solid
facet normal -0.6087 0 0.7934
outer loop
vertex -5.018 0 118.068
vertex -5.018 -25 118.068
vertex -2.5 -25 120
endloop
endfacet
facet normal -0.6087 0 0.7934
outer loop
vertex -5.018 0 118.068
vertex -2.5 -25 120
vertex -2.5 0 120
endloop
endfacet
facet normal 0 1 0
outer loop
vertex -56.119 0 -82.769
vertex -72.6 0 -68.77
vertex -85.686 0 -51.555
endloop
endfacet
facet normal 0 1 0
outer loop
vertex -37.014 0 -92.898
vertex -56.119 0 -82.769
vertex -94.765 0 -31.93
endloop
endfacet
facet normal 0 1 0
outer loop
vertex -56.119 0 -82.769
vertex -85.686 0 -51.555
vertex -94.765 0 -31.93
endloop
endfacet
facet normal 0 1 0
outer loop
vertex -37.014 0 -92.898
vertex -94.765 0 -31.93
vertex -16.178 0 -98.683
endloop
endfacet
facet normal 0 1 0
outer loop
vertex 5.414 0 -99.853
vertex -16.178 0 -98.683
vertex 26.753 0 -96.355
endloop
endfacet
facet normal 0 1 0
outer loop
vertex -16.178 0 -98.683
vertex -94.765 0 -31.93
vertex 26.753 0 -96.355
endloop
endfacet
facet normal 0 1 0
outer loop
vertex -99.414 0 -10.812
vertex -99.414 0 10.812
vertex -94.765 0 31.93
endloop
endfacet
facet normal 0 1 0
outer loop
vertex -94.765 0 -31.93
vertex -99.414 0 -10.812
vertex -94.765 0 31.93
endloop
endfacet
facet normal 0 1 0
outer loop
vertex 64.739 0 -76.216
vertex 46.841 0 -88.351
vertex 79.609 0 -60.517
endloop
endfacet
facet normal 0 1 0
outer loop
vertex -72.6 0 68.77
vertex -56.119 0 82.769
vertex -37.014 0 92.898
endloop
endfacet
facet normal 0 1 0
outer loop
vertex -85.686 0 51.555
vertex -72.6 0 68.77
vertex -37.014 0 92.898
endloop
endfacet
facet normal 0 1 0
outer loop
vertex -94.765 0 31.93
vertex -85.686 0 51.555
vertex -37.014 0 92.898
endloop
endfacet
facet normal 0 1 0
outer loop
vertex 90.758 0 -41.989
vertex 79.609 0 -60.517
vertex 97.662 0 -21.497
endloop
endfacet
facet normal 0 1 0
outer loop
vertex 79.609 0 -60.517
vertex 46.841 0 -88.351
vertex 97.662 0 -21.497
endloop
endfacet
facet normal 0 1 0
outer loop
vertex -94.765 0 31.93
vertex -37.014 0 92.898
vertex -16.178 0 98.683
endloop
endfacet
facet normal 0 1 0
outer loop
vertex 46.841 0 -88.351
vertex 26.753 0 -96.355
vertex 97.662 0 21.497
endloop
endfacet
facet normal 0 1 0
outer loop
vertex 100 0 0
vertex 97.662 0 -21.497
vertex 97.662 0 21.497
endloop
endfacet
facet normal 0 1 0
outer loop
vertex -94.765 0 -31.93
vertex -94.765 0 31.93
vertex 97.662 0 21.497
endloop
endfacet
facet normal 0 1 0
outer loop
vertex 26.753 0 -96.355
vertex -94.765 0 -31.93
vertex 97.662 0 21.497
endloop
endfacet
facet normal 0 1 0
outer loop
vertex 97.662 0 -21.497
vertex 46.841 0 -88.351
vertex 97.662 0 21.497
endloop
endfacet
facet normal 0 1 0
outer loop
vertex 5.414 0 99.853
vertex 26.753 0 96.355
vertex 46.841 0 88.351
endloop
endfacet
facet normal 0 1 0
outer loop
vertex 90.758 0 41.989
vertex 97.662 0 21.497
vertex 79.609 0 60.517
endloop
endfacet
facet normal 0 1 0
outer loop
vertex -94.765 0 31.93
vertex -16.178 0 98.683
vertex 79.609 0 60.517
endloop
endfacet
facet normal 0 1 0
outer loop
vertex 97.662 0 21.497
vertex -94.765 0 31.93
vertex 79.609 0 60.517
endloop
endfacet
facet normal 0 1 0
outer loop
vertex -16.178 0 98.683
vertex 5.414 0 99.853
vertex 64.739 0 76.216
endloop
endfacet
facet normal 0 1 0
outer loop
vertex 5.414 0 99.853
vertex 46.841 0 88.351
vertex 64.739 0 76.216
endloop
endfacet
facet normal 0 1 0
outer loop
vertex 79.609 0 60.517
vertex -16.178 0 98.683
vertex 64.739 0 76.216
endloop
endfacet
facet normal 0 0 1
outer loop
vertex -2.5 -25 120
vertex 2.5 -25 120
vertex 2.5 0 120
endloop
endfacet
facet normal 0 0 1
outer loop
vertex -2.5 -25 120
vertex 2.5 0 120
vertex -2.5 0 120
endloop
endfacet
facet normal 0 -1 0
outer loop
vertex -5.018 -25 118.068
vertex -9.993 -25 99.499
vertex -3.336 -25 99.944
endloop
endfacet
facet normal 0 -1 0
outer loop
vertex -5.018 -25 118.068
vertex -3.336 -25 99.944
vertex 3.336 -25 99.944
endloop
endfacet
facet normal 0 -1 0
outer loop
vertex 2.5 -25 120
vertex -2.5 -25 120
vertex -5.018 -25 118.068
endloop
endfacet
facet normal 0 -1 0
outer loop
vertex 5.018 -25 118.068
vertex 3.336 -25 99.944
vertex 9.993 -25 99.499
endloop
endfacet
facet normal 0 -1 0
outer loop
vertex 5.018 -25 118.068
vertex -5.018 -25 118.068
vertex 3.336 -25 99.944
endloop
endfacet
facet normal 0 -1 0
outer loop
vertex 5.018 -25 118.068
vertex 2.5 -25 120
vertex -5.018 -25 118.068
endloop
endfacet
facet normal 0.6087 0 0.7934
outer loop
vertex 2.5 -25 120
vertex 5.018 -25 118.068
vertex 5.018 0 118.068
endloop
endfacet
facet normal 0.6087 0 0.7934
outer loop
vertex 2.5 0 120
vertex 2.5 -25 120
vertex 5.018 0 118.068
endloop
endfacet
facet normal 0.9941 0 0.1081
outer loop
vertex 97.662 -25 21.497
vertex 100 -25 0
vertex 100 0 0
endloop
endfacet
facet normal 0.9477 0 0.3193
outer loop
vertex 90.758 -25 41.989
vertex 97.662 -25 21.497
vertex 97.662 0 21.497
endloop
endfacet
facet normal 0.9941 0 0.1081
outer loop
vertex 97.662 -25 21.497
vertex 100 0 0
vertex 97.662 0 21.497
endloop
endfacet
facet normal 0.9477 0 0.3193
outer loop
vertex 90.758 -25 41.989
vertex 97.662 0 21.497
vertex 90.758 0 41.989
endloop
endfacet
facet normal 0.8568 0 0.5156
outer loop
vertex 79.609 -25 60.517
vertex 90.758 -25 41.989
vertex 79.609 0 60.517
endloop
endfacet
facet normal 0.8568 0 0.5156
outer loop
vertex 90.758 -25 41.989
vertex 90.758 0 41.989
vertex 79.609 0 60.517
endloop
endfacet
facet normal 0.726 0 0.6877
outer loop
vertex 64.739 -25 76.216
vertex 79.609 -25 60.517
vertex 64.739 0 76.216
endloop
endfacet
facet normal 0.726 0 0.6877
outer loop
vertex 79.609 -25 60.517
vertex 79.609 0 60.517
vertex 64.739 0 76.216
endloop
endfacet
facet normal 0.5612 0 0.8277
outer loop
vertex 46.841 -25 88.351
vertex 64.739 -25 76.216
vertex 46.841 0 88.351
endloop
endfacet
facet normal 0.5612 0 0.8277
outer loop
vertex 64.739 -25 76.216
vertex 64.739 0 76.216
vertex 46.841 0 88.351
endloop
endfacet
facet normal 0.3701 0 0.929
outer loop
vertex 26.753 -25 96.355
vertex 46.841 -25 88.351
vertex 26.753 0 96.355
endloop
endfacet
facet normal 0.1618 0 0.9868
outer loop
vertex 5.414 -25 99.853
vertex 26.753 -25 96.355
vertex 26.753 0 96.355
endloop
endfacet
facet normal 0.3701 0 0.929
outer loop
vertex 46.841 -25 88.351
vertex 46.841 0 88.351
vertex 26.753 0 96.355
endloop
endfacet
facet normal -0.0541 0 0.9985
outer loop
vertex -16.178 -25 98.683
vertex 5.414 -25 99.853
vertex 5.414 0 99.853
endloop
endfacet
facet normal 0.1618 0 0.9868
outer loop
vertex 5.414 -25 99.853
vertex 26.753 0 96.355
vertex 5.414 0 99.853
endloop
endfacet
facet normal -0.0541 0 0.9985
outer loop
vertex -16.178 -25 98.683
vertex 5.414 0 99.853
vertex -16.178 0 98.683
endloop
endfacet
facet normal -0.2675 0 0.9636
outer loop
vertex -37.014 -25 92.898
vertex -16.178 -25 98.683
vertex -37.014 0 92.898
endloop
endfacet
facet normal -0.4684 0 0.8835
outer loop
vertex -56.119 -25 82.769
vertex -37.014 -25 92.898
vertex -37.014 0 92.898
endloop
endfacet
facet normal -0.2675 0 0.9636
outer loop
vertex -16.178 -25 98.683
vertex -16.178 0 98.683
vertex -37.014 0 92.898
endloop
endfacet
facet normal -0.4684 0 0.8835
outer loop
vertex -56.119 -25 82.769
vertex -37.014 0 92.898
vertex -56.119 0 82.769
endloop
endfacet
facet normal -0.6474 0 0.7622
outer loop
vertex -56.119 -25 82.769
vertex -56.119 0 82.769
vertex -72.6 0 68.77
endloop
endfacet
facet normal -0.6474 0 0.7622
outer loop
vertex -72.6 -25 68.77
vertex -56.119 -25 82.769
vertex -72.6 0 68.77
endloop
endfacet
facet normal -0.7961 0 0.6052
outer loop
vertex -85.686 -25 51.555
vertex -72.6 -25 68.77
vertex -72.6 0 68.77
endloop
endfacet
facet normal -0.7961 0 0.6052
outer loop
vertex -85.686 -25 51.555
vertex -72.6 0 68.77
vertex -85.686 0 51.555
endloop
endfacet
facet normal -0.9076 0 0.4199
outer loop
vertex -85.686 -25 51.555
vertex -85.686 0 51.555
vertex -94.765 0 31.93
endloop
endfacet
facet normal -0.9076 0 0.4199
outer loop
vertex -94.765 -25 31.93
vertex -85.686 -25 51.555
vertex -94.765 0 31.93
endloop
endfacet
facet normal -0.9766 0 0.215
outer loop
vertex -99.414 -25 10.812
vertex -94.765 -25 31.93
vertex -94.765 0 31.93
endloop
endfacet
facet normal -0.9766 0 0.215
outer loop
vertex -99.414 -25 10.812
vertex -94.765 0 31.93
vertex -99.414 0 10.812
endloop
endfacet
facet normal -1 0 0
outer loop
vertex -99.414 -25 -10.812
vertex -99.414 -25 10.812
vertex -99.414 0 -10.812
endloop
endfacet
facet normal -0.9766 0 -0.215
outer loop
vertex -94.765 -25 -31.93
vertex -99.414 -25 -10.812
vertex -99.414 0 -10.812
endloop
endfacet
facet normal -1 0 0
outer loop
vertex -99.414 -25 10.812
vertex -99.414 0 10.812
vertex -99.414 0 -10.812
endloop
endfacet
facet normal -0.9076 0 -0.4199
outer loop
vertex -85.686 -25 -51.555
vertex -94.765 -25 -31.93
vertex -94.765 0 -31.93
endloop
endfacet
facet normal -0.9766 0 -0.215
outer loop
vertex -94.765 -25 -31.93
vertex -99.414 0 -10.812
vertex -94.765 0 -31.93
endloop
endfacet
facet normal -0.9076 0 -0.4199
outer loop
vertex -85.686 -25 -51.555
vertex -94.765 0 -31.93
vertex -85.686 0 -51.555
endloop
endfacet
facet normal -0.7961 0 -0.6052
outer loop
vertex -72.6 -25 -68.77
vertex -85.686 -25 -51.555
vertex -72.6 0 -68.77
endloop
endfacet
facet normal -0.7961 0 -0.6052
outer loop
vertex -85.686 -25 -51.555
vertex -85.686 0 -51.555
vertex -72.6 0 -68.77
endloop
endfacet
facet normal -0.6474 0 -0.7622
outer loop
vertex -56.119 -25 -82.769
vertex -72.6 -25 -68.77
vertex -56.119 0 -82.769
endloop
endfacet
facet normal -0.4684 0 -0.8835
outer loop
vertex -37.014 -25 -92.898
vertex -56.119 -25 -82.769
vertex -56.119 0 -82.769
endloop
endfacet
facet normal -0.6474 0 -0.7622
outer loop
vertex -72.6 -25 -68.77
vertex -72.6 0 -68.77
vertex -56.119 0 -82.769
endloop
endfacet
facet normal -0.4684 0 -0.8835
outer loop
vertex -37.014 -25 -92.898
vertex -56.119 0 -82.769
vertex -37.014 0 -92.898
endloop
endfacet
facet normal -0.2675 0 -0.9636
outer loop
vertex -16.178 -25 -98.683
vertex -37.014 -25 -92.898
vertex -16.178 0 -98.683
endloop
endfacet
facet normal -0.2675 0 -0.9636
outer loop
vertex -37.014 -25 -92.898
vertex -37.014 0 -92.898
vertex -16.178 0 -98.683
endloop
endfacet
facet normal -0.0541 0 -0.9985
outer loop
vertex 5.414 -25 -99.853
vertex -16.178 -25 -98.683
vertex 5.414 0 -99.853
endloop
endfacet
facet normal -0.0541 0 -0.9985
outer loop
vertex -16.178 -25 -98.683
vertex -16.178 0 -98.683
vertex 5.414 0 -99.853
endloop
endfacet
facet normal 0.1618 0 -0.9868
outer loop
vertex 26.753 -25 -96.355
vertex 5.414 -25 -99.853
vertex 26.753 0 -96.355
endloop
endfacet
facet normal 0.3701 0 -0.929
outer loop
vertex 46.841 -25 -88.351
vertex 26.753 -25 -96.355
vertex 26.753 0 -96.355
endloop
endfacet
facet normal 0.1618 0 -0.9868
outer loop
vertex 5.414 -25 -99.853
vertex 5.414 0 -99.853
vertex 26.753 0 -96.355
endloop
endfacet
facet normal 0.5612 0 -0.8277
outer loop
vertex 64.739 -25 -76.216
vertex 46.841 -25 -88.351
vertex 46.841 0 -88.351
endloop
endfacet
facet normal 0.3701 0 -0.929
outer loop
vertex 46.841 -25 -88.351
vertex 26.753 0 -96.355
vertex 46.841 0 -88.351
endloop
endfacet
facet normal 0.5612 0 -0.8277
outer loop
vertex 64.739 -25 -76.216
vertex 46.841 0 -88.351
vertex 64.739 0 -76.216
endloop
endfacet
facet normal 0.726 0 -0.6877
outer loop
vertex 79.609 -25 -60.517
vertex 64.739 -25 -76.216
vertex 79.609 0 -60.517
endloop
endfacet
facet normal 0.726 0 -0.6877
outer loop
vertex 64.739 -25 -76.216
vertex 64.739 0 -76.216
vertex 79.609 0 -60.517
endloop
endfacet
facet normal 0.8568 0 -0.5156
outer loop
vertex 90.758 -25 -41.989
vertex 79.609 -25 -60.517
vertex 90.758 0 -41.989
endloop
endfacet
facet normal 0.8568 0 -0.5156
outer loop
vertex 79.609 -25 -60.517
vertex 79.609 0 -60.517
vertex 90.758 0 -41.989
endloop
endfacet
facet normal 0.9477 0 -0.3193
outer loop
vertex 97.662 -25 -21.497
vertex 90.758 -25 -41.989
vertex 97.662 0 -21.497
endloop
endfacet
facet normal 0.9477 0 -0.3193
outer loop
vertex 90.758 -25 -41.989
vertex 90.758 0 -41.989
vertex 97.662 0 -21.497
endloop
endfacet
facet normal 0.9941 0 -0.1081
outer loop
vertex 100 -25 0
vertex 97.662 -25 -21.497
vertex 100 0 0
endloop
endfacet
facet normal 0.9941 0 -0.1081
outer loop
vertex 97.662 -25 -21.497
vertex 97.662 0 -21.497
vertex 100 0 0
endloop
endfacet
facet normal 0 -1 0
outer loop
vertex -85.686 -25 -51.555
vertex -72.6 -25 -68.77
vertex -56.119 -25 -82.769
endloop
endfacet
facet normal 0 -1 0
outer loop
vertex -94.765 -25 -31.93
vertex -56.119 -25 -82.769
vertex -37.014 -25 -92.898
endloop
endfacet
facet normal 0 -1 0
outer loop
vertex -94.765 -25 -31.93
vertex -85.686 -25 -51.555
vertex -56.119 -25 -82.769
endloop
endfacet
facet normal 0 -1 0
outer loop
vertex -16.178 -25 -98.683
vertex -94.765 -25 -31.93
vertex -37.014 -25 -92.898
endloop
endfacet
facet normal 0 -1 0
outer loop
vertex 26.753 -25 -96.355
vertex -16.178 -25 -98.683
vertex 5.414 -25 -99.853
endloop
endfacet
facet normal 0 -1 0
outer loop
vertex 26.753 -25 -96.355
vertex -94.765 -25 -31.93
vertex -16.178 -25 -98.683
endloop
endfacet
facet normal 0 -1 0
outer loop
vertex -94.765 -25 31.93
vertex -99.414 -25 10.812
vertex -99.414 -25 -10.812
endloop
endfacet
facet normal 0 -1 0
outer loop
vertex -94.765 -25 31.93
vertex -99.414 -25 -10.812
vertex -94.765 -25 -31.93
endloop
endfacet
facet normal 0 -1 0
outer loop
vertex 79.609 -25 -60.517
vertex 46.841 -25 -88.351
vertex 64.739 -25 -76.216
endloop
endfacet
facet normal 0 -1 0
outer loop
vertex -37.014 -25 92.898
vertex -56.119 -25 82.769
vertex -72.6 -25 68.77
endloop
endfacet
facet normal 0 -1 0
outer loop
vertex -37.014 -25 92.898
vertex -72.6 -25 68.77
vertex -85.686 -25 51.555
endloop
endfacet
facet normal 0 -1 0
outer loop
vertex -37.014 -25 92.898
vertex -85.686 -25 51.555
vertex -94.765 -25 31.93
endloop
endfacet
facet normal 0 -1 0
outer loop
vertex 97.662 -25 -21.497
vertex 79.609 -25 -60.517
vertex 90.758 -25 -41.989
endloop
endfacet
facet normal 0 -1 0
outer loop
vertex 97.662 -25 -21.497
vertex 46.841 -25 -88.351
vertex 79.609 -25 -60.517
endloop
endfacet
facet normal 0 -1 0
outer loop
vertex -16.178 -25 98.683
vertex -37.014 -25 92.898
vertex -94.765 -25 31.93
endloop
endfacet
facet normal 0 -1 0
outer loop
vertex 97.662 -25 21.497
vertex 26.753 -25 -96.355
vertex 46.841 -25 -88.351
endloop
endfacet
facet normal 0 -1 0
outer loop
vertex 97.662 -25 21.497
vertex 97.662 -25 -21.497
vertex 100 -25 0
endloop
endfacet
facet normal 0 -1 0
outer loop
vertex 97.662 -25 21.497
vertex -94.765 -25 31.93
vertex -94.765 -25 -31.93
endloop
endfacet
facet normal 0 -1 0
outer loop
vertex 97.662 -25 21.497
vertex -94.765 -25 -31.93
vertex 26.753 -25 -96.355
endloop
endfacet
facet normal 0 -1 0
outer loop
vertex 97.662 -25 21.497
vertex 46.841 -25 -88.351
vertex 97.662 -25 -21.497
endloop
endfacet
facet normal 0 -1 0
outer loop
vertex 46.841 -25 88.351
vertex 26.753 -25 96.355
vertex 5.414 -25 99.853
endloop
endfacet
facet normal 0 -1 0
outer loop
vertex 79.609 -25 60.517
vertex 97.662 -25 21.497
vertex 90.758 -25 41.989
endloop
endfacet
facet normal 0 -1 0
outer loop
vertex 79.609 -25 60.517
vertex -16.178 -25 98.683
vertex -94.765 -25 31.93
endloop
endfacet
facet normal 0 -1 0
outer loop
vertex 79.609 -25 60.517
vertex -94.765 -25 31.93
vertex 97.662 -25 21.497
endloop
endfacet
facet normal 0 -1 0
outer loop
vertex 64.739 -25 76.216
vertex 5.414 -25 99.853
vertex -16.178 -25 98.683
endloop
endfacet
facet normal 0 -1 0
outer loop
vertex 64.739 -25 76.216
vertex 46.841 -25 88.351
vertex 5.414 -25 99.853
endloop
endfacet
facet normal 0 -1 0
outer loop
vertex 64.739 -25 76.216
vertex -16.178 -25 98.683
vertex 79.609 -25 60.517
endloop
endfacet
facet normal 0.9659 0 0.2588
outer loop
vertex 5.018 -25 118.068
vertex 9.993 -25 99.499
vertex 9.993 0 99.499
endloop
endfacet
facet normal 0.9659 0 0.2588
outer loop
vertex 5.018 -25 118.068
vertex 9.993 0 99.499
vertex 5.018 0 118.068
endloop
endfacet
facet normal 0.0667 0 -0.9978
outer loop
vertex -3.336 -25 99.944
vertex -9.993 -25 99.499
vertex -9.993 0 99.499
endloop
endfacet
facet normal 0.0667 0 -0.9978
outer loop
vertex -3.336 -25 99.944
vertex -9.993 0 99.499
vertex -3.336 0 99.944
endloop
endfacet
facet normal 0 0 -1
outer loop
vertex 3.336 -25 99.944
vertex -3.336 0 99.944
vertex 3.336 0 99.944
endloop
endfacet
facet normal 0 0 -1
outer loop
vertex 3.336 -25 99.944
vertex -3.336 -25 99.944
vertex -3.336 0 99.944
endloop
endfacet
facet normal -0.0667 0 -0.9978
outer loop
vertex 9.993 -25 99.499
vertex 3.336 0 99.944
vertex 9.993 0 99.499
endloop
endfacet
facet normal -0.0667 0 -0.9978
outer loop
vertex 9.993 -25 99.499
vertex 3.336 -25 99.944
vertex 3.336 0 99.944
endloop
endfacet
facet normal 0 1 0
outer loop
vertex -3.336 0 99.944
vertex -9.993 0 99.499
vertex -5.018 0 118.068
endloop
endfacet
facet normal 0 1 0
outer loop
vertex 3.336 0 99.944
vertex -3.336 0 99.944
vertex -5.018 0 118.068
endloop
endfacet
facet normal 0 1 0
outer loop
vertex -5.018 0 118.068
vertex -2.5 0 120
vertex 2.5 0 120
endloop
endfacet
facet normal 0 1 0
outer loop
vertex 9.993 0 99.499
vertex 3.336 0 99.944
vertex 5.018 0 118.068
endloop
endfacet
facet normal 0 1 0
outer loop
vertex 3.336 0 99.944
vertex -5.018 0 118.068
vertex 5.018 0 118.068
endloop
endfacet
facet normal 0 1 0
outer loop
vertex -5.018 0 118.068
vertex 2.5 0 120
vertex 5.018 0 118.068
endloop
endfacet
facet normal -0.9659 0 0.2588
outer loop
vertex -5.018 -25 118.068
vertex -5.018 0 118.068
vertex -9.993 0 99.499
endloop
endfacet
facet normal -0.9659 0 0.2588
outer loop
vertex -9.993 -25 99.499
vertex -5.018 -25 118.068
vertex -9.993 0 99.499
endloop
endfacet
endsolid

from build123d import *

# Parameters (mm, degrees)
F0_R     = 100
F1_DEPTH = 25
F3_DEPTH = 25
F4_SIZE  = 2


with BuildPart() as f1:
    # F0 (on Front) → F1 (new body)
    with BuildSketch(Plane.XZ):
        Circle(F0_R)
    extrude(amount=F1_DEPTH)


with BuildPart() as f3:
    # F2 (on face) → F3 (new body)
    with BuildSketch(Plane.XZ.offset(25)):
        with BuildLine():
            Line((4.5, 120), (-4.5, 120))
            Line((-4.5, 120), (-9.99311, 99.499436))
            ThreePointArc((-9.99311, 99.499436), (0, 100), (9.99311, 99.499436))
            Line((9.99311, 99.499436), (4.5, 120))
        make_face()
    extrude(amount=-F3_DEPTH)

    # F4
    f4_edges = [f3.edges().sort_by_distance(p)[0] for p in [
        (4.5, -12.5, 120),
        (-4.5, -12.5, 120),
    ]]
    chamfer(f4_edges, length=F4_SIZE)


solid = Compound([f1.part, f3.part])
